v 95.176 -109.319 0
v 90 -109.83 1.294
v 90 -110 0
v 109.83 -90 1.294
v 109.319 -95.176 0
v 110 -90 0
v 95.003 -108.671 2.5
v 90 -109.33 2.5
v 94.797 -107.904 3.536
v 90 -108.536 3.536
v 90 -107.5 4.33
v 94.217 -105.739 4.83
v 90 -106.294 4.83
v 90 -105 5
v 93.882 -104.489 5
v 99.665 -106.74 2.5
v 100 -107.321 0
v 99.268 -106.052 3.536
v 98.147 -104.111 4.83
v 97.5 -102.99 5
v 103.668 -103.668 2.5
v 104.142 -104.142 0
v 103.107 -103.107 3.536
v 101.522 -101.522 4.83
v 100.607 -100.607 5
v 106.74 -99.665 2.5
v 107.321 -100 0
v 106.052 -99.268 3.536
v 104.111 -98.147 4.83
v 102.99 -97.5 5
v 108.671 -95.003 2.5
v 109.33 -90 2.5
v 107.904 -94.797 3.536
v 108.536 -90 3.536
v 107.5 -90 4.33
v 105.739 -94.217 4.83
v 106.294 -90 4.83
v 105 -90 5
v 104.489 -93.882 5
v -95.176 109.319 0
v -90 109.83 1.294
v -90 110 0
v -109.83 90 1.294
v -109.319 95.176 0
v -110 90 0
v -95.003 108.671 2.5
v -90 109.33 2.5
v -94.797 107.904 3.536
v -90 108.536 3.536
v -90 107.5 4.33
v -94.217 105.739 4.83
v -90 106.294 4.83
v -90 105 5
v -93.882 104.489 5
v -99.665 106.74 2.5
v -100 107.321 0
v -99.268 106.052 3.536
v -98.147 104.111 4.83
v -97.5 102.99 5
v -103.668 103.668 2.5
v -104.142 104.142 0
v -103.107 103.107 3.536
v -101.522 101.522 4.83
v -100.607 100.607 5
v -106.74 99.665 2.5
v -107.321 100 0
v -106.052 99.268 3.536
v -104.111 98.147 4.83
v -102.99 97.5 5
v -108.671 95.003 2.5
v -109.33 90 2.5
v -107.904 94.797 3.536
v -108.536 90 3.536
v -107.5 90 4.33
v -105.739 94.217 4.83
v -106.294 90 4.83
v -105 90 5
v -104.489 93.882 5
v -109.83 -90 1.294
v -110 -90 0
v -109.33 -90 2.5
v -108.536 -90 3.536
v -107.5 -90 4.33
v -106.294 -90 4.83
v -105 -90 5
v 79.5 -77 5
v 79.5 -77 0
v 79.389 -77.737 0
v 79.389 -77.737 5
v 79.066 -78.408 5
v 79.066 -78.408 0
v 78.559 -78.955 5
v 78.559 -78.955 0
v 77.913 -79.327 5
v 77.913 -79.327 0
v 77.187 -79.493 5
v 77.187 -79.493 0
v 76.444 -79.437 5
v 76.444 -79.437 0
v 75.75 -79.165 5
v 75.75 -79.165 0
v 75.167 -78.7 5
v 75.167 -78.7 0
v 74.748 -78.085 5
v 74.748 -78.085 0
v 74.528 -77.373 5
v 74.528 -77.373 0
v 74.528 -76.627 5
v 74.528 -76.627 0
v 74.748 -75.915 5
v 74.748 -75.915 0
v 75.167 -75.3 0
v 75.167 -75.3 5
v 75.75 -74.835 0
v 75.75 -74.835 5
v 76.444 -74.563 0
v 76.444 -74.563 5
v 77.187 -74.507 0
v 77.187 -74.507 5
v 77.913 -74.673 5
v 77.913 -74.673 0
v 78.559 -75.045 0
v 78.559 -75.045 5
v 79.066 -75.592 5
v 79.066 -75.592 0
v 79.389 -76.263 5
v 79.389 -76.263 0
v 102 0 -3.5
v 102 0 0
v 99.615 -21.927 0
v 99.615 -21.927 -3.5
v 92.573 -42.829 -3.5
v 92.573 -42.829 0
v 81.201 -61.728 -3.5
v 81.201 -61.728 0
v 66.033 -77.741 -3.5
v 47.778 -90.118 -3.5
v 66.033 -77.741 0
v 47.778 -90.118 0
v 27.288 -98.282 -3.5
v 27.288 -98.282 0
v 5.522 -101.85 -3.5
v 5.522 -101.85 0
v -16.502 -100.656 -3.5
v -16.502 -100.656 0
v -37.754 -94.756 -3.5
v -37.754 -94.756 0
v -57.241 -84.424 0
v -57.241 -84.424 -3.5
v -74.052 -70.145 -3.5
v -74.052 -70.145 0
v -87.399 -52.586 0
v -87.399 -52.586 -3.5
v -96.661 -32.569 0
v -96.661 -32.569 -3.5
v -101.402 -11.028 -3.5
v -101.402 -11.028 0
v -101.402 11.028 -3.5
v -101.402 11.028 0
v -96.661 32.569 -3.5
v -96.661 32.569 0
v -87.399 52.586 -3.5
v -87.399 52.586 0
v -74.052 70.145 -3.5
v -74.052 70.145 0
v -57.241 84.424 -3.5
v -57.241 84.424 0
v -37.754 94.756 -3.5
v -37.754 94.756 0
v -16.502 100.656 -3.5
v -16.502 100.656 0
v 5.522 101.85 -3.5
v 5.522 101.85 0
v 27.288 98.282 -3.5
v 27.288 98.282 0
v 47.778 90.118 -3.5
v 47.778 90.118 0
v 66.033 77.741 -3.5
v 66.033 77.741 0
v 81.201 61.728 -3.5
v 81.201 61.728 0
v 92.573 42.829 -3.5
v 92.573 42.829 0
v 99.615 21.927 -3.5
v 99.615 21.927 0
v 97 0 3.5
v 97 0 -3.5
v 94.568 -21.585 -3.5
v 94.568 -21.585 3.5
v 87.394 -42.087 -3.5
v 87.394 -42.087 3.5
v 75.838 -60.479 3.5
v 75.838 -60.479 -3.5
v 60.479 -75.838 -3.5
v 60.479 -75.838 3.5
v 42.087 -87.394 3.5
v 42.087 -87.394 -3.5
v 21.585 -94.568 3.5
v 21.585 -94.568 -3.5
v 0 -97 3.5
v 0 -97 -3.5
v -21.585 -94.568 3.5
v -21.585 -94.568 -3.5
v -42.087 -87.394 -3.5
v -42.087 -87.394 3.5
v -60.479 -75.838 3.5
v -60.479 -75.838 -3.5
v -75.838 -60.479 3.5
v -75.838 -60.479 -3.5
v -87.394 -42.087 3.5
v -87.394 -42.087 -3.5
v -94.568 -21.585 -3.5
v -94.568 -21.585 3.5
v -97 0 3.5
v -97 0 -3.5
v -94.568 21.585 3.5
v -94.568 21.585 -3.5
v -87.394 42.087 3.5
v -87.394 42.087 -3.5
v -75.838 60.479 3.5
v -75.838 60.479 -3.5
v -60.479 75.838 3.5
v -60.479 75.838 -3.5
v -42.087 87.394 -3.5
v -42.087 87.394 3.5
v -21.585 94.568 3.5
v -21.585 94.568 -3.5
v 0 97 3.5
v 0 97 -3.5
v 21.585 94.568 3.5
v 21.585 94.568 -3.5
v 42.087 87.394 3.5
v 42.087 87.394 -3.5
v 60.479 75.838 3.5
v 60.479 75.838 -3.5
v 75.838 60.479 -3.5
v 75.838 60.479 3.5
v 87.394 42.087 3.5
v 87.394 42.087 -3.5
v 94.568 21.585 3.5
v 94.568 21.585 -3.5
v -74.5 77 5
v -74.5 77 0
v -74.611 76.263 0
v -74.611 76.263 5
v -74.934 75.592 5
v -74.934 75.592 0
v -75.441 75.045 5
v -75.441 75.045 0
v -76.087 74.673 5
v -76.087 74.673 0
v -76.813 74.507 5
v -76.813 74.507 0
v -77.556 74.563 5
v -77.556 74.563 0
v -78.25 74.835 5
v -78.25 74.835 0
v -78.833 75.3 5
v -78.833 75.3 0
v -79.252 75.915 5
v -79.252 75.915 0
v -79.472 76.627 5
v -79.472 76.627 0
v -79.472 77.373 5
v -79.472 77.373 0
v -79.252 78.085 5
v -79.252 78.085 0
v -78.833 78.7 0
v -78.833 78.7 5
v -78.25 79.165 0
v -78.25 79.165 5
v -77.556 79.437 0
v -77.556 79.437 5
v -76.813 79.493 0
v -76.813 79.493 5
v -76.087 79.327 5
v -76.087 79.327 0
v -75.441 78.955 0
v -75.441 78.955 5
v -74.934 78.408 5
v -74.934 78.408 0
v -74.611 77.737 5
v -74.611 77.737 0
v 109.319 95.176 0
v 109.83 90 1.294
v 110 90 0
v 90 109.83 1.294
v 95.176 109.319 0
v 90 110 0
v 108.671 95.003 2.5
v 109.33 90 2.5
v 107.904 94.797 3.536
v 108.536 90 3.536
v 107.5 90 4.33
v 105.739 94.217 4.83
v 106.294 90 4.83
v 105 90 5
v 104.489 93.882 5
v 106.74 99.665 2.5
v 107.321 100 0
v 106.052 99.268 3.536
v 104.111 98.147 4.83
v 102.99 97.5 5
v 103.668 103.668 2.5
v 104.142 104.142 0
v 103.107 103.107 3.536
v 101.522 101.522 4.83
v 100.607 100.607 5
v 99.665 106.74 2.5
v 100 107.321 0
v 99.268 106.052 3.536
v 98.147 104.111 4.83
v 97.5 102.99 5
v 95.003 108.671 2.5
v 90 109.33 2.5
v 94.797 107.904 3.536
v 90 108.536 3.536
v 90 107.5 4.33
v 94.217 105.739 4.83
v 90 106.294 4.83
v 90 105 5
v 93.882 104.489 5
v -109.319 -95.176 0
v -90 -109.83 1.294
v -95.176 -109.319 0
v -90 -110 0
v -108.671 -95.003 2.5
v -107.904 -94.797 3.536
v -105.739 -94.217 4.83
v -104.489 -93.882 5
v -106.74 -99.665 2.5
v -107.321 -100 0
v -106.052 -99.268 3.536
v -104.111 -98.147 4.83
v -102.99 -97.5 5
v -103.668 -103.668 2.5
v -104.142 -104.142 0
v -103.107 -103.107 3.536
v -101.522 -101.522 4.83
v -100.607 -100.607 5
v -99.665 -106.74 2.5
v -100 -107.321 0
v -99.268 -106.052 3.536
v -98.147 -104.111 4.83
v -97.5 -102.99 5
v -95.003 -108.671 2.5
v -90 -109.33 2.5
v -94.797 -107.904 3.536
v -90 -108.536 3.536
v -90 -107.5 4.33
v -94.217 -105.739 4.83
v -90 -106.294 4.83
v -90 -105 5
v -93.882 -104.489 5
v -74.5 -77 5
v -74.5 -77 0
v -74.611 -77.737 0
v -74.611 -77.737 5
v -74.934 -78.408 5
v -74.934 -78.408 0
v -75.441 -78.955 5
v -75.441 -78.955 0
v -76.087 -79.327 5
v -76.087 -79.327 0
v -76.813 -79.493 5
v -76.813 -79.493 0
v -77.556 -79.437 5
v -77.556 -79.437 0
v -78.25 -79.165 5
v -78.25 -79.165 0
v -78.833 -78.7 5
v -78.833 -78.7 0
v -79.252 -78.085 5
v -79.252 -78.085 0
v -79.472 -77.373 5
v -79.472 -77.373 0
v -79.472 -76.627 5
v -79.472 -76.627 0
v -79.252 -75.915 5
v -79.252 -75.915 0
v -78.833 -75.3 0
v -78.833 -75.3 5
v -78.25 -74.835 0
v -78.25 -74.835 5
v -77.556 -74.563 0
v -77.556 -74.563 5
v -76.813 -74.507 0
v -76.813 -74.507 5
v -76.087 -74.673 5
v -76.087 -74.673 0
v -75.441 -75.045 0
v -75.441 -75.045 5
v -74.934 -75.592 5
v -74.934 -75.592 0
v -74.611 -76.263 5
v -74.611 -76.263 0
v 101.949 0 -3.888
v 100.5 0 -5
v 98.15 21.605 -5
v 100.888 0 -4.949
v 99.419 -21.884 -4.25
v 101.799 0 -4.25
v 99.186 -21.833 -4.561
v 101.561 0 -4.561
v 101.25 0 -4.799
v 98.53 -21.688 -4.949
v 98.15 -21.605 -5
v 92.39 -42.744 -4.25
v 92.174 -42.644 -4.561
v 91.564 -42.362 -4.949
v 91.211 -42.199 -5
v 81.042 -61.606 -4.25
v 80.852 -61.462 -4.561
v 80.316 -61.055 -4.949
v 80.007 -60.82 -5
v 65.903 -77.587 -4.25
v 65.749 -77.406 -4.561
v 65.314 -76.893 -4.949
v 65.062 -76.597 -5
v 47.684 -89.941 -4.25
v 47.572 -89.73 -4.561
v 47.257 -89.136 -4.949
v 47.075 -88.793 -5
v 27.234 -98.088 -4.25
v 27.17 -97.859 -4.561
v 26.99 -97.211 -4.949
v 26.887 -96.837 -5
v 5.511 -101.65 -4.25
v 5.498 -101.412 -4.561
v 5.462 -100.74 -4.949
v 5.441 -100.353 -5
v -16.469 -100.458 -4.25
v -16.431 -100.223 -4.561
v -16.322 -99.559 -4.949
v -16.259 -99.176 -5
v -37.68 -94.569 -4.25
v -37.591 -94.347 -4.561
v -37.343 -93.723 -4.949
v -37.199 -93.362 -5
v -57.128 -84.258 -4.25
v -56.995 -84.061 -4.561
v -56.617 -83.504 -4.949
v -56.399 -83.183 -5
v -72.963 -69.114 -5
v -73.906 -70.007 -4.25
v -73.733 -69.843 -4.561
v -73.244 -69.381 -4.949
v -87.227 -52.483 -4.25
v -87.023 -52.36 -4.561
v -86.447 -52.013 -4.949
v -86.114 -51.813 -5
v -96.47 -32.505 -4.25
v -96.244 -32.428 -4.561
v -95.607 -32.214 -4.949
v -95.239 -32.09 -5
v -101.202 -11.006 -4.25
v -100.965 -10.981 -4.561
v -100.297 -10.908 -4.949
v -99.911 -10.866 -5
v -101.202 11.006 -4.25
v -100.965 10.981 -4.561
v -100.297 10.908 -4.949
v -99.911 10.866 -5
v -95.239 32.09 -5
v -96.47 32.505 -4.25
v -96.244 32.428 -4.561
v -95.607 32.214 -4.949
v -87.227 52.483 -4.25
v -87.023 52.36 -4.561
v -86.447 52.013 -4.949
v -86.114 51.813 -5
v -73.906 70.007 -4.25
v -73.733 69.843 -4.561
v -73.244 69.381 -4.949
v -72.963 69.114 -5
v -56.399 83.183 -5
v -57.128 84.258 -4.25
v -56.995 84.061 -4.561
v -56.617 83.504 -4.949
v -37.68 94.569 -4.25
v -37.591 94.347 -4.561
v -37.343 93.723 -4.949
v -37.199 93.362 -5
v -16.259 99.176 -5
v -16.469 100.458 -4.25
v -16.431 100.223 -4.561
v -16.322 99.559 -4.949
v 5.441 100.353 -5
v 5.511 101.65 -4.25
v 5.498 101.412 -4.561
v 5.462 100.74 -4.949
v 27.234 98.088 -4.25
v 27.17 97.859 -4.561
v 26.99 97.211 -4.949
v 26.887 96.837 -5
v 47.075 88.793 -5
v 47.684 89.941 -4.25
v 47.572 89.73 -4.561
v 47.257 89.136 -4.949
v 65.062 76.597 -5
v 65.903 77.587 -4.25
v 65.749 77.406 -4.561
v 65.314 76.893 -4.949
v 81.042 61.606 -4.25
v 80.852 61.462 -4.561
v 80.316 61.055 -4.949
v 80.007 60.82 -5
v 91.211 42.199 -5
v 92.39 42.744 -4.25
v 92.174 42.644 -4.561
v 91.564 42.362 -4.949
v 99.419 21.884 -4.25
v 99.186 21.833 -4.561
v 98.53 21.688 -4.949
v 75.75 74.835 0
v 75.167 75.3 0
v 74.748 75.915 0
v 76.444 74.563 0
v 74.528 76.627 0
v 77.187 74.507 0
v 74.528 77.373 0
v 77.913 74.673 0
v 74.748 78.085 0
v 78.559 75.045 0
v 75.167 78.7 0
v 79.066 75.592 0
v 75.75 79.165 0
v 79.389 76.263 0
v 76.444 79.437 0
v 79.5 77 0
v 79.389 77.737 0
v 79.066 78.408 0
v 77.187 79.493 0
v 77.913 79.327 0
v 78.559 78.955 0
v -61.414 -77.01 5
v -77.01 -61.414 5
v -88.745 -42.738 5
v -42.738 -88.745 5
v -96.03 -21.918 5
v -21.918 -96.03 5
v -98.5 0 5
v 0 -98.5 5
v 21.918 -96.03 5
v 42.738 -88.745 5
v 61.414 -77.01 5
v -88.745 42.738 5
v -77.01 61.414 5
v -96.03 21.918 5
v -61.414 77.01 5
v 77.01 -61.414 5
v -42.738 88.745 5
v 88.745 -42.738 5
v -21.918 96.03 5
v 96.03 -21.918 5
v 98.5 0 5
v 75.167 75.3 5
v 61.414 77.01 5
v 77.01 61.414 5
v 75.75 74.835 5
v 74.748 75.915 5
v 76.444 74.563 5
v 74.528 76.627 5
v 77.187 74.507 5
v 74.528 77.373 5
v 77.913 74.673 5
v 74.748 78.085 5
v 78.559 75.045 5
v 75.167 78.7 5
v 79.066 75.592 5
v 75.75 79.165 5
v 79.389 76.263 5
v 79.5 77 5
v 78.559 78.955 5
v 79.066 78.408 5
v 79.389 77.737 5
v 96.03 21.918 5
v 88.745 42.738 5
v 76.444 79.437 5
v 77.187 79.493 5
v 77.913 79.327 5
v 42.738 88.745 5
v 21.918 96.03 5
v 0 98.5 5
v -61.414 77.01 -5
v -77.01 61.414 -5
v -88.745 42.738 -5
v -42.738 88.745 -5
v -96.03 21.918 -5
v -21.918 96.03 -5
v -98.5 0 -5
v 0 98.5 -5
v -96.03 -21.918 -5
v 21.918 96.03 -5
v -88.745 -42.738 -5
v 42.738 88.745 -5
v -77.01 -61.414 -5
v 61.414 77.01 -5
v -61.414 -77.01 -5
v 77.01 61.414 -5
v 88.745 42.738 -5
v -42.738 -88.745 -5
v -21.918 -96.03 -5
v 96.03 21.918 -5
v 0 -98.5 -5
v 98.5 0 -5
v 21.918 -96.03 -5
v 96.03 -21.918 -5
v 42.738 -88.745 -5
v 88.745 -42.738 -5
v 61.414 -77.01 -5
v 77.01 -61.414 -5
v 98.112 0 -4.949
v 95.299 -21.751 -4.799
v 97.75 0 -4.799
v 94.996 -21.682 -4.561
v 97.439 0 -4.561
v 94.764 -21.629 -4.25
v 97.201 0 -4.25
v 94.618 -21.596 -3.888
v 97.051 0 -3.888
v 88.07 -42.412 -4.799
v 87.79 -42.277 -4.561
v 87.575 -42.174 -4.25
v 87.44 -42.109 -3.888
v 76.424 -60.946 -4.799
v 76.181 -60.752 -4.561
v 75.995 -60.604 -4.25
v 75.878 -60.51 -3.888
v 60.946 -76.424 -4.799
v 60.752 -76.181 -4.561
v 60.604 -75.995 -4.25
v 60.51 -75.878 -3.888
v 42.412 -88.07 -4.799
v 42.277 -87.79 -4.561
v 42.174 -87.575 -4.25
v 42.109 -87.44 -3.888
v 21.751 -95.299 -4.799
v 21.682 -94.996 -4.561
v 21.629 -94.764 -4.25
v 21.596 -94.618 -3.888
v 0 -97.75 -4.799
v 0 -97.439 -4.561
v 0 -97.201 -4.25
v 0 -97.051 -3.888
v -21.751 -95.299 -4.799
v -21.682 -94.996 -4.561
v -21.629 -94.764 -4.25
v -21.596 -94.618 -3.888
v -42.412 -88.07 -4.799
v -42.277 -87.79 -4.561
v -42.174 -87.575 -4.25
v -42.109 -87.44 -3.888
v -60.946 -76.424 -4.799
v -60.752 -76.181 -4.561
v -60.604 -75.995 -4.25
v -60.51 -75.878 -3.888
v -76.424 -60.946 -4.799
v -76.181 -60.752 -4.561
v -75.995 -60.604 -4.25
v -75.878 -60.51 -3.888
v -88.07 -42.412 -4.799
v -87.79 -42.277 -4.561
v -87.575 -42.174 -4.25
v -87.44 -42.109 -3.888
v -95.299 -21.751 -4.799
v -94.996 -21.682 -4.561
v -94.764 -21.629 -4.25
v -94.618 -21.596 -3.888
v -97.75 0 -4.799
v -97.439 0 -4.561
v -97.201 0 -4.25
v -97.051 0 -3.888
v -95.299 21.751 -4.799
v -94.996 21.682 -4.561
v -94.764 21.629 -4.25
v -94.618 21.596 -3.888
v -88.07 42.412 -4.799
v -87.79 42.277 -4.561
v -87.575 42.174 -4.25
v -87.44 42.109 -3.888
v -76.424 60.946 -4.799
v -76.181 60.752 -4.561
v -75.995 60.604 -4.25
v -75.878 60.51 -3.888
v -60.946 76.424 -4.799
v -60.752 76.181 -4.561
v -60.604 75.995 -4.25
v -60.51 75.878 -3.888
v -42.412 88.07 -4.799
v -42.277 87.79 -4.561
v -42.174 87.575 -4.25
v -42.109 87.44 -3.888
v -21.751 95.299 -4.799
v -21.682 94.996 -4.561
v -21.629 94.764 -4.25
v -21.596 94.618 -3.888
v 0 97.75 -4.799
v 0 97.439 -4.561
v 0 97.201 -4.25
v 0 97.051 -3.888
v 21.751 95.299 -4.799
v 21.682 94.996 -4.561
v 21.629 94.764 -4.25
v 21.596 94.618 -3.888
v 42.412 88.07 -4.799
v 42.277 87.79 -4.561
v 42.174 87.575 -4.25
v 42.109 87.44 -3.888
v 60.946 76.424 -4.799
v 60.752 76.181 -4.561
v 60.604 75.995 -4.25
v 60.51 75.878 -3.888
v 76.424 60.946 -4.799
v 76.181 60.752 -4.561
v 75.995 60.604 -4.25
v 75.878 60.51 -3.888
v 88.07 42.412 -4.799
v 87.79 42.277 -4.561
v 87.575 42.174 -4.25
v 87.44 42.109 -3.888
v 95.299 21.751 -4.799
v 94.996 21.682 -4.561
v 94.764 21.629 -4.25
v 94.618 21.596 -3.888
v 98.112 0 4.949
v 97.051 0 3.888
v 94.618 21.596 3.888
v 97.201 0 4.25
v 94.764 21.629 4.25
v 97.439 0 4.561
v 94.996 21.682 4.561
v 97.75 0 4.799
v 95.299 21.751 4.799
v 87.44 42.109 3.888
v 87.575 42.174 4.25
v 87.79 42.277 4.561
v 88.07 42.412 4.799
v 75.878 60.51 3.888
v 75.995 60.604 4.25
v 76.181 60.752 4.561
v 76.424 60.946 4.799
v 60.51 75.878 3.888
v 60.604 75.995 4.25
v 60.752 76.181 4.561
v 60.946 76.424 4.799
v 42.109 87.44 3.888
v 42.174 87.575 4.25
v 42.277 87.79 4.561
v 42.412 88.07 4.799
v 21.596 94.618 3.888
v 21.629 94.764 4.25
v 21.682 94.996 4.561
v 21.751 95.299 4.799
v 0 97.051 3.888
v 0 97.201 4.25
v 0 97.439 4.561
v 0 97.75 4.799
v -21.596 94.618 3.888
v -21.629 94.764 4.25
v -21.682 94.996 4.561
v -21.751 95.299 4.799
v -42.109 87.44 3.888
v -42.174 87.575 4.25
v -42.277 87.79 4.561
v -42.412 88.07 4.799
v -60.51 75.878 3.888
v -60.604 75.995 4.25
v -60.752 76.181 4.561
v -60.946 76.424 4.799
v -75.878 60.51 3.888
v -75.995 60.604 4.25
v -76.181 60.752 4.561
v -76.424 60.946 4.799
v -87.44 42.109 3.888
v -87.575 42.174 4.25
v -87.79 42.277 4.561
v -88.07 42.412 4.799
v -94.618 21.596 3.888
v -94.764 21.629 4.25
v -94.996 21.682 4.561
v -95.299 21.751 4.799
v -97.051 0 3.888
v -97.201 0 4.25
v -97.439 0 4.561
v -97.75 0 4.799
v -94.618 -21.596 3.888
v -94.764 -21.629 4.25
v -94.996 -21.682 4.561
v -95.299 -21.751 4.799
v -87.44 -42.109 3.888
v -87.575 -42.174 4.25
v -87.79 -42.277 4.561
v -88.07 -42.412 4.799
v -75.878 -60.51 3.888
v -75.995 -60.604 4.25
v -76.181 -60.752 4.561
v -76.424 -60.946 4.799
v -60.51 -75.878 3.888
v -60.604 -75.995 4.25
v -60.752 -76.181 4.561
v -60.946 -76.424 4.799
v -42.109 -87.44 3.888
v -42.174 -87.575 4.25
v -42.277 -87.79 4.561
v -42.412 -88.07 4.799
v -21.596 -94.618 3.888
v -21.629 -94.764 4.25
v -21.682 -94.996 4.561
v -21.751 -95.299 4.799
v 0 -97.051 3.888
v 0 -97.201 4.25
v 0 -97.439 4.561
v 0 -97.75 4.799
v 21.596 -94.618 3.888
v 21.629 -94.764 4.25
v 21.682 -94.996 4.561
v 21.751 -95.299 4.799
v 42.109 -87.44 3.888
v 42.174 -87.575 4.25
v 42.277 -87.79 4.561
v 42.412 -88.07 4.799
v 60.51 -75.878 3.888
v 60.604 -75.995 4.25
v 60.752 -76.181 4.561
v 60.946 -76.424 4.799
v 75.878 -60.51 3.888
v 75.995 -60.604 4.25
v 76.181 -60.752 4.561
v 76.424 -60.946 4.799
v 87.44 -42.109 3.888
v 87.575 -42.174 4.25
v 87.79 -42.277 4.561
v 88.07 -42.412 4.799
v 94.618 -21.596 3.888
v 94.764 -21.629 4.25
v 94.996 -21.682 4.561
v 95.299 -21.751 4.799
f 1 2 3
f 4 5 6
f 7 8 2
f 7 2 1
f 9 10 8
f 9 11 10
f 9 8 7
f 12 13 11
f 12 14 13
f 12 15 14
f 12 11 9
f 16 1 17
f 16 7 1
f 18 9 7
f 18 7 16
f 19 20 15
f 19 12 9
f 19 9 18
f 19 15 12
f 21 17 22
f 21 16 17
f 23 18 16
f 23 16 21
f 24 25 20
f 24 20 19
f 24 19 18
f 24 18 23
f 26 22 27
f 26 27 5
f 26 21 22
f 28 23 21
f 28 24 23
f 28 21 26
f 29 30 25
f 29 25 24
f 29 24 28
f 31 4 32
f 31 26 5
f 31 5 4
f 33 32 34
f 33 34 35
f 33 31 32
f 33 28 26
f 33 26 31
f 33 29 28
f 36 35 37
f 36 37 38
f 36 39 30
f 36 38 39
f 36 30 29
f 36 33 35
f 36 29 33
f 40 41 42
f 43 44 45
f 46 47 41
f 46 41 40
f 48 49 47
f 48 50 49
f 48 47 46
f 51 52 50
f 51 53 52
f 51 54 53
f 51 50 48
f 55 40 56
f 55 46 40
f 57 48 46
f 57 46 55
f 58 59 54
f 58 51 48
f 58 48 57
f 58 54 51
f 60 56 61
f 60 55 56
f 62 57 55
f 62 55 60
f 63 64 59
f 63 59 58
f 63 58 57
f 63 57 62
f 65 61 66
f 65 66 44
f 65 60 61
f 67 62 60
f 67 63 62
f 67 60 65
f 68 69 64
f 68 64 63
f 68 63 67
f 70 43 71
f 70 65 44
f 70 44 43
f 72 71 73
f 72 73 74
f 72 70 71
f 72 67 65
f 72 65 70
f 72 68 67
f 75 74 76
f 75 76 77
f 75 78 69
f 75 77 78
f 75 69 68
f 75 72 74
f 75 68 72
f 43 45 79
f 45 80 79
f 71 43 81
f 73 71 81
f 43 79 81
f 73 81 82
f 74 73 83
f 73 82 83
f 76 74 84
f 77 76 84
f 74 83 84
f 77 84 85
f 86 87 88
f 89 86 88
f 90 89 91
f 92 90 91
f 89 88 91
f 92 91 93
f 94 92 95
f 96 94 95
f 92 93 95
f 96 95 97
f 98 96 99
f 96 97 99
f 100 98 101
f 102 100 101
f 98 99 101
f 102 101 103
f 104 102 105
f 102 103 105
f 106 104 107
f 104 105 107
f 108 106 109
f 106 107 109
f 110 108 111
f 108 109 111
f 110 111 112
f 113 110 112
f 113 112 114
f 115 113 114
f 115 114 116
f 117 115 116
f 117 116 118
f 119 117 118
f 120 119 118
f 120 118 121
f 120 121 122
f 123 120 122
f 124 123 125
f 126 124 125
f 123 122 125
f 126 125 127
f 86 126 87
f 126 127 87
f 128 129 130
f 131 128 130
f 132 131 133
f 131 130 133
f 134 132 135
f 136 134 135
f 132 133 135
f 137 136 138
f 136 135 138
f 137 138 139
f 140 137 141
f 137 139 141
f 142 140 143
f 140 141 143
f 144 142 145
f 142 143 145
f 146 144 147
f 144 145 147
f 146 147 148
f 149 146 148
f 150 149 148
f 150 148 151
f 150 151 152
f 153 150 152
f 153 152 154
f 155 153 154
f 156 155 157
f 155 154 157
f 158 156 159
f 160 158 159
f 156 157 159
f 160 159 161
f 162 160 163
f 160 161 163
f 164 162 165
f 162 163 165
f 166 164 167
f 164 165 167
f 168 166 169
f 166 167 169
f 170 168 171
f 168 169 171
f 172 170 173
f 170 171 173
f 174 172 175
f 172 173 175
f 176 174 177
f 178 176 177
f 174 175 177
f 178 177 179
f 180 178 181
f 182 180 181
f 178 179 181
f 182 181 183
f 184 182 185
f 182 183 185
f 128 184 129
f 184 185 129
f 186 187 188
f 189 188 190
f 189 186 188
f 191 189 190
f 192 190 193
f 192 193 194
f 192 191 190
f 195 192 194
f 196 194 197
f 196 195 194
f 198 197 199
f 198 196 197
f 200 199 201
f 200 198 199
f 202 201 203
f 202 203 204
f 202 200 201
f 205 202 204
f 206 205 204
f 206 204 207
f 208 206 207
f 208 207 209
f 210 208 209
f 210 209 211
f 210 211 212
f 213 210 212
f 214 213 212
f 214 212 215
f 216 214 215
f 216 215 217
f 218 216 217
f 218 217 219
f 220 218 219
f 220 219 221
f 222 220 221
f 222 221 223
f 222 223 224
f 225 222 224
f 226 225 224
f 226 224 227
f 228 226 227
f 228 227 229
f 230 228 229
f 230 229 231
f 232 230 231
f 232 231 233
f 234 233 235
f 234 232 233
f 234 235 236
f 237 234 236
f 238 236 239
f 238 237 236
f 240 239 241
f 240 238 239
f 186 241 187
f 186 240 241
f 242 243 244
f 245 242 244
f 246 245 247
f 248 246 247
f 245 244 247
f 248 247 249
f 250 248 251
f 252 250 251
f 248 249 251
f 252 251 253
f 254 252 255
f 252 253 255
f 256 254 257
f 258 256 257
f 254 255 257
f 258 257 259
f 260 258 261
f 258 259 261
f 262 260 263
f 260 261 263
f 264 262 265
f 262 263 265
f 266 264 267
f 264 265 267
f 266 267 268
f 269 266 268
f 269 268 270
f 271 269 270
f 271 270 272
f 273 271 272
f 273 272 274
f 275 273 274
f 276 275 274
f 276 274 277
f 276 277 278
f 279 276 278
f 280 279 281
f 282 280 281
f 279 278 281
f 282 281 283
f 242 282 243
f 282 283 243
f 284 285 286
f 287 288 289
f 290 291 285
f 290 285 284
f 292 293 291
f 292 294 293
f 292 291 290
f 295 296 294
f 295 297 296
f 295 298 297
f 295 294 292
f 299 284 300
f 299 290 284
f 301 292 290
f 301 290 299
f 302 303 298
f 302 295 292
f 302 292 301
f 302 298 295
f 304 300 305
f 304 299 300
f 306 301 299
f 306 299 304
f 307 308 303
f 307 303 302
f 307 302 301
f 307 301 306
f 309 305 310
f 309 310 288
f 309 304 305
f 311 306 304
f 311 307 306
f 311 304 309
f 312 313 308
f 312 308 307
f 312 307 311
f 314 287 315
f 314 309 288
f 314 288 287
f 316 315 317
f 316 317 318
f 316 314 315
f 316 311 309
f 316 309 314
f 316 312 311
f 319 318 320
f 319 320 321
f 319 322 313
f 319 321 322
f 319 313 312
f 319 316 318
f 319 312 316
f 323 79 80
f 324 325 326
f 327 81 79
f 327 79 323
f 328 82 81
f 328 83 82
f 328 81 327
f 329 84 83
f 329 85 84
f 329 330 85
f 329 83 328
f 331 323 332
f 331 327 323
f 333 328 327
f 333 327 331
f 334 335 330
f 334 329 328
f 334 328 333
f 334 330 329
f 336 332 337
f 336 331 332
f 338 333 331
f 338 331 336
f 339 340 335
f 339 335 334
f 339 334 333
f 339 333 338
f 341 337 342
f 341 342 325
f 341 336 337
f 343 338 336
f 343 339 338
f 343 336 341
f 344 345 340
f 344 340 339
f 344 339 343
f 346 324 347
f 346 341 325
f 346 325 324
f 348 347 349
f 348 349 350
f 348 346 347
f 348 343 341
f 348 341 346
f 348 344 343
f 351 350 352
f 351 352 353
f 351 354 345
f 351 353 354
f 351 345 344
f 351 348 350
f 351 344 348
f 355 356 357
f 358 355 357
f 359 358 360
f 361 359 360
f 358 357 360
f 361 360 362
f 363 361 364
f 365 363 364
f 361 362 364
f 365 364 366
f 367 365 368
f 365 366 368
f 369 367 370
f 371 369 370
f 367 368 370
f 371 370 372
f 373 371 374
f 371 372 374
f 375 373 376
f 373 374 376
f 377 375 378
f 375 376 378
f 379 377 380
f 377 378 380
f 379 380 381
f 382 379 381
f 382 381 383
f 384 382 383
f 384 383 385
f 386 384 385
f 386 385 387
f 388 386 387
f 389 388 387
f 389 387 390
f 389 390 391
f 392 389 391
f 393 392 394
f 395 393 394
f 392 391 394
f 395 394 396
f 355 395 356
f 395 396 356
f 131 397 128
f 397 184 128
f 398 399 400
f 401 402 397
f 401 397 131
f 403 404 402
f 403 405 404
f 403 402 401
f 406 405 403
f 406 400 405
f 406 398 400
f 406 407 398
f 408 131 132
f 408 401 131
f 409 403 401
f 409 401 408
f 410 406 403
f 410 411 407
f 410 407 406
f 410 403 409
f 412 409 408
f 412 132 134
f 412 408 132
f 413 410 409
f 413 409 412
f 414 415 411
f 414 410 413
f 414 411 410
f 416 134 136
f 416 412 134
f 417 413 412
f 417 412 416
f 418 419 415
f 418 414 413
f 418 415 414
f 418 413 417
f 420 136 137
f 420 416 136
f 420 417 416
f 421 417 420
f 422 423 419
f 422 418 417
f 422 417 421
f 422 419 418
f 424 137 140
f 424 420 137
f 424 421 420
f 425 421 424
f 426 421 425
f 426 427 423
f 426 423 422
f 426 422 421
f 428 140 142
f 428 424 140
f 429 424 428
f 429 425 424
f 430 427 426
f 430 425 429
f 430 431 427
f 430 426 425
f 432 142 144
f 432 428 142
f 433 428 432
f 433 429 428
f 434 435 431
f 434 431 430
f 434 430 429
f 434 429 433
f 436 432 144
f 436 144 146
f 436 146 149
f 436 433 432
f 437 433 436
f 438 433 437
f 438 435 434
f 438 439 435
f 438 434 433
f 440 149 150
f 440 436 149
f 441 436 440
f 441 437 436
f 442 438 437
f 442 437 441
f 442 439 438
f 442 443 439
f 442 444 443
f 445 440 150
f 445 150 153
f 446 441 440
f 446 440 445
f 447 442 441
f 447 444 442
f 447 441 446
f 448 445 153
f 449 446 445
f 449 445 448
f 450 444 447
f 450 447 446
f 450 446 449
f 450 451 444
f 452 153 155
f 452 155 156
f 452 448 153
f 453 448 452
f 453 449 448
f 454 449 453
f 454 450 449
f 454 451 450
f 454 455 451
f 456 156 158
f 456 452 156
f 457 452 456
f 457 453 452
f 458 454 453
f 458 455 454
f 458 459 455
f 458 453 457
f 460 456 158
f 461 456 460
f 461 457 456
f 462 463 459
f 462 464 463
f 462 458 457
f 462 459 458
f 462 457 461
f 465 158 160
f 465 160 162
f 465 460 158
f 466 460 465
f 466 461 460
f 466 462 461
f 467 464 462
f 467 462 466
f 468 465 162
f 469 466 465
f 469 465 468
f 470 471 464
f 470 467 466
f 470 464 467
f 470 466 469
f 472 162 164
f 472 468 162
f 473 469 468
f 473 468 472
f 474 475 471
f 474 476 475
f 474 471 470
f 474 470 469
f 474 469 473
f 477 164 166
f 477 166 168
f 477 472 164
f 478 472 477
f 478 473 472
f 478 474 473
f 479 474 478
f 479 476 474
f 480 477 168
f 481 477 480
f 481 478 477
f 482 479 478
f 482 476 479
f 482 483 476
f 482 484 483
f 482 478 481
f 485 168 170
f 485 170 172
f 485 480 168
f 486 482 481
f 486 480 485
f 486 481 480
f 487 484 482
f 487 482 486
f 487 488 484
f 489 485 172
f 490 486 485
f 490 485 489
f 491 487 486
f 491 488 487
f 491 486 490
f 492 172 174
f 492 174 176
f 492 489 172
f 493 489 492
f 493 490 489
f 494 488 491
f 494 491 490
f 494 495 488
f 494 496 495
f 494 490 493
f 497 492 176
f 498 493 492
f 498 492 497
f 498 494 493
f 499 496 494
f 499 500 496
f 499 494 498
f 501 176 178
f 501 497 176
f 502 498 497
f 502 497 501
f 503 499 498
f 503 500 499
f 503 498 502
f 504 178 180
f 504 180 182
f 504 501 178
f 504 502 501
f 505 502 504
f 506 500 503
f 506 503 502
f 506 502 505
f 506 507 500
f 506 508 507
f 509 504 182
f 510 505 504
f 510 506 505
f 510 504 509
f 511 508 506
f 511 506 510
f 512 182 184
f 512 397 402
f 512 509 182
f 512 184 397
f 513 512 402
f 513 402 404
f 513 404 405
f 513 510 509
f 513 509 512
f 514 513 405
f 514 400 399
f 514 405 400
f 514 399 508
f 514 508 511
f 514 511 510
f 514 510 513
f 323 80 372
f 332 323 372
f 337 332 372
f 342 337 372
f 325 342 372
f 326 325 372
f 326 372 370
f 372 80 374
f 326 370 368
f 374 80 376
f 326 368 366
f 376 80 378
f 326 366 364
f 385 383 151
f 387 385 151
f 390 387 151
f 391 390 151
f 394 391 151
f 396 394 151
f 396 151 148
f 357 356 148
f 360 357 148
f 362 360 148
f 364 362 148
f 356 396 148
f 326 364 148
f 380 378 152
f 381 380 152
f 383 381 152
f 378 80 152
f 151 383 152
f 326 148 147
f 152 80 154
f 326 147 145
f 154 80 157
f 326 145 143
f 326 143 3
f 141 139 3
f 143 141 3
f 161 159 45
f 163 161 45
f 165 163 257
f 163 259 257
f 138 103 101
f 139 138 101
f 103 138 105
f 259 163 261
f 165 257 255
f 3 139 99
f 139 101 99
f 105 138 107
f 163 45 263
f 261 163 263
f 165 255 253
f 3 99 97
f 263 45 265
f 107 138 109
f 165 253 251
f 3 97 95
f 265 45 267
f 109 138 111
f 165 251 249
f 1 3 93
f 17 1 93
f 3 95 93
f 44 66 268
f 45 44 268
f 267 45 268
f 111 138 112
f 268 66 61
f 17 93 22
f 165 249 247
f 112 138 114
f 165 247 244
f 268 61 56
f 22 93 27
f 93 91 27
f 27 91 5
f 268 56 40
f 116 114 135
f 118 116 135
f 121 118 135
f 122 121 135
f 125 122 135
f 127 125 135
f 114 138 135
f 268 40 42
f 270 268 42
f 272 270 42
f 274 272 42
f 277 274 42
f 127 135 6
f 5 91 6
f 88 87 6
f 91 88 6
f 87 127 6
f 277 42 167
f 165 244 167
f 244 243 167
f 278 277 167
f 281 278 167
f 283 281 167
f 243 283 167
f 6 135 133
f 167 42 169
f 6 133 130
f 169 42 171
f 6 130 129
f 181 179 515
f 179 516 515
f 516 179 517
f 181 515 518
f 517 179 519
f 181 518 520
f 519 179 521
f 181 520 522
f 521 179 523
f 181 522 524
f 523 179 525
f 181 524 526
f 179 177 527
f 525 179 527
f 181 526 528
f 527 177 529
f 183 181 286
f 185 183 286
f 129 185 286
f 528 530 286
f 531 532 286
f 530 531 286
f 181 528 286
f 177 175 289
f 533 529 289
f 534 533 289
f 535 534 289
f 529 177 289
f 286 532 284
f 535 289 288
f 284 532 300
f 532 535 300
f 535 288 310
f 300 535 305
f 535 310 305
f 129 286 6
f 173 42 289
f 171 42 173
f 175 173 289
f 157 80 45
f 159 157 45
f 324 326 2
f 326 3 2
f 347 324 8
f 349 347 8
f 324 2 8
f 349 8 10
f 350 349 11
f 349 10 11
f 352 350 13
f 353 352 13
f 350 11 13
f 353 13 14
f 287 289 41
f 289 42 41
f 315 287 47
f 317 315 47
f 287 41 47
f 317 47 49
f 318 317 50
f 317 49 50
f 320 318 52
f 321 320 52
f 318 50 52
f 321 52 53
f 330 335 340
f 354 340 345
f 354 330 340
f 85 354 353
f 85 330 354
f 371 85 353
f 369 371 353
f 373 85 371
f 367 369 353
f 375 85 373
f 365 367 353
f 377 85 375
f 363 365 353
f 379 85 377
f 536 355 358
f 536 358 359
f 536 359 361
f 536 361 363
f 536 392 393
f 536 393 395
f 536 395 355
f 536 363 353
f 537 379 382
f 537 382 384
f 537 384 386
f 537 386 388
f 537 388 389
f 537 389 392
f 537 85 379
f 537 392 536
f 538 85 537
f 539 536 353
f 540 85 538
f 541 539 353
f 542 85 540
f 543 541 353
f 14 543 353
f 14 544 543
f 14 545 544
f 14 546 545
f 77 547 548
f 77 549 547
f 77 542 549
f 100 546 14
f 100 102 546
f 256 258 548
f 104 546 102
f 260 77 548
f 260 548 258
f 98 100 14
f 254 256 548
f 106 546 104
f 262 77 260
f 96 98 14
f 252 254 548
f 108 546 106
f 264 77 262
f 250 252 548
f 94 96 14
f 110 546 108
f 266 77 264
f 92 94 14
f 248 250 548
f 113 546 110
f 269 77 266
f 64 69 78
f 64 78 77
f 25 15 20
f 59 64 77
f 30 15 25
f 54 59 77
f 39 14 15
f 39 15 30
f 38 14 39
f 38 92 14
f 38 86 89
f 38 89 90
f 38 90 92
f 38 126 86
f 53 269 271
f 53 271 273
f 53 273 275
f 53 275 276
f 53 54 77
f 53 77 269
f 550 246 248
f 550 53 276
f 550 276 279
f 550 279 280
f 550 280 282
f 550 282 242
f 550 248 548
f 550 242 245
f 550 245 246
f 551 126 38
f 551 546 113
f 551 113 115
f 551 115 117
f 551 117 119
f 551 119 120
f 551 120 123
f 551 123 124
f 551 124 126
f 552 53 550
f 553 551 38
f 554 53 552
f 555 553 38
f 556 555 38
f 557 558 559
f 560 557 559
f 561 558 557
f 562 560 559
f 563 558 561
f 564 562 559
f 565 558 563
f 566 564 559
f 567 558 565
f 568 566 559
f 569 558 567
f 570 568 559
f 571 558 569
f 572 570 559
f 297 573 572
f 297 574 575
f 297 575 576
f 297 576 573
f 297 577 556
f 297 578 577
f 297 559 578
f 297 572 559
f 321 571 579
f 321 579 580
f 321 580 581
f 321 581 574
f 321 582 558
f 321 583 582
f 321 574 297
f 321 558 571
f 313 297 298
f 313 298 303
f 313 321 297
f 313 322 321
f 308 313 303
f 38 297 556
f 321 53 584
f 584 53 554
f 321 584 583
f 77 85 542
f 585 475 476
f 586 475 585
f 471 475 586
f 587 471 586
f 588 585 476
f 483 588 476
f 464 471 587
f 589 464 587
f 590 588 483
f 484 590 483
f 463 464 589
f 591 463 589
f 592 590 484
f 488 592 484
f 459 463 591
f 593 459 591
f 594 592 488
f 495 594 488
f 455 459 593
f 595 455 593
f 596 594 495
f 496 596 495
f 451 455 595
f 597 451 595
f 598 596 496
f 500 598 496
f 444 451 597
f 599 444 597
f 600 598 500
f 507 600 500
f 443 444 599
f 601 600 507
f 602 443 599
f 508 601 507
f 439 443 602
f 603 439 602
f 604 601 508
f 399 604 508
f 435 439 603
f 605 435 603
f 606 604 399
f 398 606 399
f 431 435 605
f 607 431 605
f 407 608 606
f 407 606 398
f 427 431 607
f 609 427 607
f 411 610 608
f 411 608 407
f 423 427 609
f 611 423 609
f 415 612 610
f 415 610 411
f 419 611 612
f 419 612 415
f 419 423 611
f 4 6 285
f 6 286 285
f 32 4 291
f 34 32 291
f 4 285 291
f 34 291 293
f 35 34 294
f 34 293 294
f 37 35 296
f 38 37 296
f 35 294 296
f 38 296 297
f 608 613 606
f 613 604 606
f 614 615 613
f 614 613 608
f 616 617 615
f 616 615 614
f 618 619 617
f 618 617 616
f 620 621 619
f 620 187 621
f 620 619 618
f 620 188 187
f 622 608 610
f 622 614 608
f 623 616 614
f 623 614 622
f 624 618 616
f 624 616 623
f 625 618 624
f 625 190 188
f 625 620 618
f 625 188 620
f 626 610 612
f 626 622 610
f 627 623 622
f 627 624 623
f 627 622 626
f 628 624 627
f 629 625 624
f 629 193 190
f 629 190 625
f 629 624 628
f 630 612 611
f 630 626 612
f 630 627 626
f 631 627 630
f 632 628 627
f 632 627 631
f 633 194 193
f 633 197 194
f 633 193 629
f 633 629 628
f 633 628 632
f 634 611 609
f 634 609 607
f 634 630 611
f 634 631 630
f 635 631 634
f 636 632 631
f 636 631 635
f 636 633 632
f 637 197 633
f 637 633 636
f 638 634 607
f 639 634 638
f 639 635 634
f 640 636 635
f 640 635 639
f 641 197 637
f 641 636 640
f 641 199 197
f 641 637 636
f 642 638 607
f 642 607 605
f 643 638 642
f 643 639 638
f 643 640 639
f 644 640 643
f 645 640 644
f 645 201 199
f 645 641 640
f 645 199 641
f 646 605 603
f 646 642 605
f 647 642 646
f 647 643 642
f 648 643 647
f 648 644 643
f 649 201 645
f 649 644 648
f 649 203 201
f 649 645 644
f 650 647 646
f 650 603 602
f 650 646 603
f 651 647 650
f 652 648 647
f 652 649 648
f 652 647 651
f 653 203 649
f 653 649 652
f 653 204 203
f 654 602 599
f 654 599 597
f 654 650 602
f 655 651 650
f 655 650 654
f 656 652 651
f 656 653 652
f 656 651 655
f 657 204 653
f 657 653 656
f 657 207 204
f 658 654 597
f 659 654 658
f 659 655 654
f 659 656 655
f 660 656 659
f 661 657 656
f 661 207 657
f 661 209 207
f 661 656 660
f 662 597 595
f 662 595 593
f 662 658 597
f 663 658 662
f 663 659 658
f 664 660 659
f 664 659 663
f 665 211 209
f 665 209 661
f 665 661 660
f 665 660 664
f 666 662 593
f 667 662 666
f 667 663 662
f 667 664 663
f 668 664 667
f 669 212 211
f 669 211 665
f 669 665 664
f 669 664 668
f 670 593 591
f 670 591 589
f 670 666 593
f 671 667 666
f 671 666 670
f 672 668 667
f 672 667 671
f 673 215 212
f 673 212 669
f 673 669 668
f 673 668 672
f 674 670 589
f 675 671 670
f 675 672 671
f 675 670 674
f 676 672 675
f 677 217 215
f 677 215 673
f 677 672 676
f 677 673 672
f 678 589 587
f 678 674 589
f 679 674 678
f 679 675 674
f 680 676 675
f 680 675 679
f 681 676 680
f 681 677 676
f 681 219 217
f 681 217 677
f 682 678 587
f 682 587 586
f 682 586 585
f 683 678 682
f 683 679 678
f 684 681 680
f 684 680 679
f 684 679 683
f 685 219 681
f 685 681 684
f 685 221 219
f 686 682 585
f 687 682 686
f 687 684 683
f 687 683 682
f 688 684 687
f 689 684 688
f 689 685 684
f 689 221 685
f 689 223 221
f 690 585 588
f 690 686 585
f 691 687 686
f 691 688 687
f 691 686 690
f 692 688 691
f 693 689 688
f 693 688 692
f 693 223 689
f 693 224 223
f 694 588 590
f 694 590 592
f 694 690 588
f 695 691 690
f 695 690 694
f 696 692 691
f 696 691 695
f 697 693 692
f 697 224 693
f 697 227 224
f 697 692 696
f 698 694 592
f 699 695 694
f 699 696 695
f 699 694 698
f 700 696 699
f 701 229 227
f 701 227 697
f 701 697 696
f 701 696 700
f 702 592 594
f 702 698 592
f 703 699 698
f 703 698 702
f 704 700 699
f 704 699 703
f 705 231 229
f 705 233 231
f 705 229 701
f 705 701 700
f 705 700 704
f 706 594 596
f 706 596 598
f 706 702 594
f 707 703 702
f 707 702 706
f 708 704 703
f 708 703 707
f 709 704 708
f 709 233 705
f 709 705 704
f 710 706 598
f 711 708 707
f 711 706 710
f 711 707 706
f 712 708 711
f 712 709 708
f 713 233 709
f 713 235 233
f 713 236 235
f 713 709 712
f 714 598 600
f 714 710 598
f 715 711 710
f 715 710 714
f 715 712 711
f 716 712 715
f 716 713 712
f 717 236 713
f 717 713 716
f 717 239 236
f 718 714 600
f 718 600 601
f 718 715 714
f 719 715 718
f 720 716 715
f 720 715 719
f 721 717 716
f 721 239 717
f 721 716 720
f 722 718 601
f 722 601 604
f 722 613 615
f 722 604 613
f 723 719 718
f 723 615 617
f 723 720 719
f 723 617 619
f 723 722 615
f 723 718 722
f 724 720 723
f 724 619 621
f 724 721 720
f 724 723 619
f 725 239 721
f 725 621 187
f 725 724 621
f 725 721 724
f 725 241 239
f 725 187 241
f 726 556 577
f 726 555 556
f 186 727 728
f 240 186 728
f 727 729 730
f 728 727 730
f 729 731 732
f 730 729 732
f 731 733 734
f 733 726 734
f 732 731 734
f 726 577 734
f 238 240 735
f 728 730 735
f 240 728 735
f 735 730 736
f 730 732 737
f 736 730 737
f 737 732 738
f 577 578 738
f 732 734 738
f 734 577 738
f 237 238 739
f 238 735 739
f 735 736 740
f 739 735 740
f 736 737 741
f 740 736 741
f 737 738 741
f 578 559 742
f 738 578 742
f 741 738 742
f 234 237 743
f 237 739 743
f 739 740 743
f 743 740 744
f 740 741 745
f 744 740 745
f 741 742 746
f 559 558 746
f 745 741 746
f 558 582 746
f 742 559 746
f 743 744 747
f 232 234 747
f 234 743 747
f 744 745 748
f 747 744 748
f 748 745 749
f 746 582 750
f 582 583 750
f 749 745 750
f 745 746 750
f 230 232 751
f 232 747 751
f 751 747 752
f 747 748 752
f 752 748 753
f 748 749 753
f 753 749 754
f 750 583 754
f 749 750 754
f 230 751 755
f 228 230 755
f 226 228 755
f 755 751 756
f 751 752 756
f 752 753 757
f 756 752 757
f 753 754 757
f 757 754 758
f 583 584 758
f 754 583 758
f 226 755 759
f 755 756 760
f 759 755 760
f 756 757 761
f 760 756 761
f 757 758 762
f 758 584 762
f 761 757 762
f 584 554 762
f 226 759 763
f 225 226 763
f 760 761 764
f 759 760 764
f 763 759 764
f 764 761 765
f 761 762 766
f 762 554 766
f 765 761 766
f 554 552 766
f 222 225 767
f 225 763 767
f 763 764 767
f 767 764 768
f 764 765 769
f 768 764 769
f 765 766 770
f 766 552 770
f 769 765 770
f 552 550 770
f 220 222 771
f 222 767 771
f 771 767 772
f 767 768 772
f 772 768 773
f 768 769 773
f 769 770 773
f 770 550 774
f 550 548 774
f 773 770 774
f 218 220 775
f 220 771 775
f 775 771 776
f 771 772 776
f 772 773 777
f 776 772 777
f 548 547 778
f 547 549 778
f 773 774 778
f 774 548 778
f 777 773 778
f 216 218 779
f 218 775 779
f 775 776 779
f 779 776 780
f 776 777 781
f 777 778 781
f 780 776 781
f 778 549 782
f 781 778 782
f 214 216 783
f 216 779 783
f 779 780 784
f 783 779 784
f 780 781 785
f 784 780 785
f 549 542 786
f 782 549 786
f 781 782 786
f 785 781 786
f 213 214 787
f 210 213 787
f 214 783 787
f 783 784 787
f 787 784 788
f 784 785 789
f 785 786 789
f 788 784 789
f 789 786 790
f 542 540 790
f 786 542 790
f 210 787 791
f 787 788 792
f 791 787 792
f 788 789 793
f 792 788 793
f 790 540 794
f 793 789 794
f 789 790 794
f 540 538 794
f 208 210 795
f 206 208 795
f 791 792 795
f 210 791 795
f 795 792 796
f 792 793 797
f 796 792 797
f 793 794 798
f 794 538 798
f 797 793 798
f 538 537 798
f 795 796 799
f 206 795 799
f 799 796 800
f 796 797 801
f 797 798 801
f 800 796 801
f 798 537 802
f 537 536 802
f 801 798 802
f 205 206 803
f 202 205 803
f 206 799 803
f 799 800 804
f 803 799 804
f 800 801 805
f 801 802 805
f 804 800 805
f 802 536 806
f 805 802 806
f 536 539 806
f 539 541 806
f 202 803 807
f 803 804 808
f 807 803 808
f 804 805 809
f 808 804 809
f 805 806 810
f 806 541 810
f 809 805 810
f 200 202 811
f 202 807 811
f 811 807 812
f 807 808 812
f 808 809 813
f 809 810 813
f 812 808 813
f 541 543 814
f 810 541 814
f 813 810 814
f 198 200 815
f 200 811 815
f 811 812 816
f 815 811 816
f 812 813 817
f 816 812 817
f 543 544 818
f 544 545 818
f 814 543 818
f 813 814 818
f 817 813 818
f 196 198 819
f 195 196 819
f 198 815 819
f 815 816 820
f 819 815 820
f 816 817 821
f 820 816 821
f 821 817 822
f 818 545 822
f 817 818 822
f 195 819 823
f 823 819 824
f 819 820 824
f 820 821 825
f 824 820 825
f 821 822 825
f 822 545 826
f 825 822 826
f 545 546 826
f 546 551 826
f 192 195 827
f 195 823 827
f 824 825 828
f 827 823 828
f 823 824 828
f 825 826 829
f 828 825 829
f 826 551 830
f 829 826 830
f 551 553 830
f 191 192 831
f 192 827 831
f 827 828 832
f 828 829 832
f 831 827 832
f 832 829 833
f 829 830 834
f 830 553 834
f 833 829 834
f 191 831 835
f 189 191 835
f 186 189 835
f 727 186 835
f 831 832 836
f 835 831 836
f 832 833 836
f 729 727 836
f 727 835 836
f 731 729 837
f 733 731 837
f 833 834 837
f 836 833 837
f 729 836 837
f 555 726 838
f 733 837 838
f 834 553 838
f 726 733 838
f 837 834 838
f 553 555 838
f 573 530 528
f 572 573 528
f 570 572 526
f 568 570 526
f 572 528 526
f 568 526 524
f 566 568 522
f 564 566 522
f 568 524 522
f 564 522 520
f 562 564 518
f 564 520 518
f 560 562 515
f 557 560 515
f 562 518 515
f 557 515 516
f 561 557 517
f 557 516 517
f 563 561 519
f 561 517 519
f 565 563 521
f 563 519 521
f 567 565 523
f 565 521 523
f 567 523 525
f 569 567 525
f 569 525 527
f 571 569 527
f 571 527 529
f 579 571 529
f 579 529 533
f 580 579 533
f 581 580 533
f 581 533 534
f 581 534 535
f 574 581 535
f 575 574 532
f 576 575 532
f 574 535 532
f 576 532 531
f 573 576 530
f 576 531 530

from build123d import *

# Parameters (mm, degrees)
F0_R     = 97
F1_DEPTH = 5
F3_R     = 102
F3_R_2   = 97
F4_DEPTH = 5
F5_R     = 1.5
F6_R     = 4.99999
F2_R     = 2.5
F7_DEPTH = 5


# Not quite as in the source:
# - a fillet or chamfer is up to 0.001 mm smaller than in the source, because OpenCascade refuses the exact size


with BuildPart() as f1:
    # F0 (on Top) → F1 (new body)
    with BuildSketch(Plane.XY):
        with BuildLine():
            Line((-90, -110), (90, -110))
            ThreePointArc((90, -110), (104.1421356237, -104.1421356237), (110, -90))
            Line((110, -90), (110, 90))
            ThreePointArc((110, 90), (104.1421356237, 104.1421356237), (90, 110))
            Line((90, 110), (-90, 110))
            ThreePointArc((-90, 110), (-104.1421356237, 104.1421356237), (-110, 90))
            Line((-110, 90), (-110, -90))
            ThreePointArc((-110, -90), (-104.1421356237, -104.1421356237), (-90, -110))
        make_face()
        Circle(F0_R, mode=Mode.SUBTRACT)
    extrude(amount=F1_DEPTH)

    # F3 (on face) → F4 (join)
    with BuildSketch(Plane(origin=(0, 0, 0), x_dir=(1, 0, 0), z_dir=(0, 0, -1))):
        Circle(F3_R)
        Circle(F3_R_2, mode=Mode.SUBTRACT)
    extrude(amount=F4_DEPTH)

    # F5
    f5_edges = [f1.edges().sort_by_distance(p)[0] for p in [
        (-97, 0, -5),
        (-102, 0, -5),
        (-97, 0, 5),
    ]]
    fillet(f5_edges, radius=F5_R)

    # F6 (radius 5 in the source; OpenCascade refuses exactly that, so slightly less here)
    f6_edges = [f1.edges().sort_by_distance(p)[0] for p in [
        (-98.5, 0, 5),
        (0, -110, 5),
        (104.142136, -104.142136, 5),
        (110, 0, 5),
        (104.142136, 104.142136, 5),
        (0, 110, 5),
        (-104.142136, 104.142136, 5),
        (-110, 0, 5),
        (-104.142136, -104.142136, 5),
    ]]
    fillet(f6_edges, radius=F6_R)

    # F2 (on face) → F7 (cut, through all)
    with BuildSketch(Plane(origin=(0, 0, 0), x_dir=(1, 0, 0), z_dir=(0, 0, -1))):
        with Locations((-77, 77)):
            Circle(F2_R)
        with Locations((77, 77)):
            Circle(F2_R)
        with Locations((77, -77)):
            Circle(F2_R)
        with Locations((-77, -77)):
            Circle(F2_R)
    extrude(amount=-F7_DEPTH, mode=Mode.SUBTRACT)


solid = f1.part
